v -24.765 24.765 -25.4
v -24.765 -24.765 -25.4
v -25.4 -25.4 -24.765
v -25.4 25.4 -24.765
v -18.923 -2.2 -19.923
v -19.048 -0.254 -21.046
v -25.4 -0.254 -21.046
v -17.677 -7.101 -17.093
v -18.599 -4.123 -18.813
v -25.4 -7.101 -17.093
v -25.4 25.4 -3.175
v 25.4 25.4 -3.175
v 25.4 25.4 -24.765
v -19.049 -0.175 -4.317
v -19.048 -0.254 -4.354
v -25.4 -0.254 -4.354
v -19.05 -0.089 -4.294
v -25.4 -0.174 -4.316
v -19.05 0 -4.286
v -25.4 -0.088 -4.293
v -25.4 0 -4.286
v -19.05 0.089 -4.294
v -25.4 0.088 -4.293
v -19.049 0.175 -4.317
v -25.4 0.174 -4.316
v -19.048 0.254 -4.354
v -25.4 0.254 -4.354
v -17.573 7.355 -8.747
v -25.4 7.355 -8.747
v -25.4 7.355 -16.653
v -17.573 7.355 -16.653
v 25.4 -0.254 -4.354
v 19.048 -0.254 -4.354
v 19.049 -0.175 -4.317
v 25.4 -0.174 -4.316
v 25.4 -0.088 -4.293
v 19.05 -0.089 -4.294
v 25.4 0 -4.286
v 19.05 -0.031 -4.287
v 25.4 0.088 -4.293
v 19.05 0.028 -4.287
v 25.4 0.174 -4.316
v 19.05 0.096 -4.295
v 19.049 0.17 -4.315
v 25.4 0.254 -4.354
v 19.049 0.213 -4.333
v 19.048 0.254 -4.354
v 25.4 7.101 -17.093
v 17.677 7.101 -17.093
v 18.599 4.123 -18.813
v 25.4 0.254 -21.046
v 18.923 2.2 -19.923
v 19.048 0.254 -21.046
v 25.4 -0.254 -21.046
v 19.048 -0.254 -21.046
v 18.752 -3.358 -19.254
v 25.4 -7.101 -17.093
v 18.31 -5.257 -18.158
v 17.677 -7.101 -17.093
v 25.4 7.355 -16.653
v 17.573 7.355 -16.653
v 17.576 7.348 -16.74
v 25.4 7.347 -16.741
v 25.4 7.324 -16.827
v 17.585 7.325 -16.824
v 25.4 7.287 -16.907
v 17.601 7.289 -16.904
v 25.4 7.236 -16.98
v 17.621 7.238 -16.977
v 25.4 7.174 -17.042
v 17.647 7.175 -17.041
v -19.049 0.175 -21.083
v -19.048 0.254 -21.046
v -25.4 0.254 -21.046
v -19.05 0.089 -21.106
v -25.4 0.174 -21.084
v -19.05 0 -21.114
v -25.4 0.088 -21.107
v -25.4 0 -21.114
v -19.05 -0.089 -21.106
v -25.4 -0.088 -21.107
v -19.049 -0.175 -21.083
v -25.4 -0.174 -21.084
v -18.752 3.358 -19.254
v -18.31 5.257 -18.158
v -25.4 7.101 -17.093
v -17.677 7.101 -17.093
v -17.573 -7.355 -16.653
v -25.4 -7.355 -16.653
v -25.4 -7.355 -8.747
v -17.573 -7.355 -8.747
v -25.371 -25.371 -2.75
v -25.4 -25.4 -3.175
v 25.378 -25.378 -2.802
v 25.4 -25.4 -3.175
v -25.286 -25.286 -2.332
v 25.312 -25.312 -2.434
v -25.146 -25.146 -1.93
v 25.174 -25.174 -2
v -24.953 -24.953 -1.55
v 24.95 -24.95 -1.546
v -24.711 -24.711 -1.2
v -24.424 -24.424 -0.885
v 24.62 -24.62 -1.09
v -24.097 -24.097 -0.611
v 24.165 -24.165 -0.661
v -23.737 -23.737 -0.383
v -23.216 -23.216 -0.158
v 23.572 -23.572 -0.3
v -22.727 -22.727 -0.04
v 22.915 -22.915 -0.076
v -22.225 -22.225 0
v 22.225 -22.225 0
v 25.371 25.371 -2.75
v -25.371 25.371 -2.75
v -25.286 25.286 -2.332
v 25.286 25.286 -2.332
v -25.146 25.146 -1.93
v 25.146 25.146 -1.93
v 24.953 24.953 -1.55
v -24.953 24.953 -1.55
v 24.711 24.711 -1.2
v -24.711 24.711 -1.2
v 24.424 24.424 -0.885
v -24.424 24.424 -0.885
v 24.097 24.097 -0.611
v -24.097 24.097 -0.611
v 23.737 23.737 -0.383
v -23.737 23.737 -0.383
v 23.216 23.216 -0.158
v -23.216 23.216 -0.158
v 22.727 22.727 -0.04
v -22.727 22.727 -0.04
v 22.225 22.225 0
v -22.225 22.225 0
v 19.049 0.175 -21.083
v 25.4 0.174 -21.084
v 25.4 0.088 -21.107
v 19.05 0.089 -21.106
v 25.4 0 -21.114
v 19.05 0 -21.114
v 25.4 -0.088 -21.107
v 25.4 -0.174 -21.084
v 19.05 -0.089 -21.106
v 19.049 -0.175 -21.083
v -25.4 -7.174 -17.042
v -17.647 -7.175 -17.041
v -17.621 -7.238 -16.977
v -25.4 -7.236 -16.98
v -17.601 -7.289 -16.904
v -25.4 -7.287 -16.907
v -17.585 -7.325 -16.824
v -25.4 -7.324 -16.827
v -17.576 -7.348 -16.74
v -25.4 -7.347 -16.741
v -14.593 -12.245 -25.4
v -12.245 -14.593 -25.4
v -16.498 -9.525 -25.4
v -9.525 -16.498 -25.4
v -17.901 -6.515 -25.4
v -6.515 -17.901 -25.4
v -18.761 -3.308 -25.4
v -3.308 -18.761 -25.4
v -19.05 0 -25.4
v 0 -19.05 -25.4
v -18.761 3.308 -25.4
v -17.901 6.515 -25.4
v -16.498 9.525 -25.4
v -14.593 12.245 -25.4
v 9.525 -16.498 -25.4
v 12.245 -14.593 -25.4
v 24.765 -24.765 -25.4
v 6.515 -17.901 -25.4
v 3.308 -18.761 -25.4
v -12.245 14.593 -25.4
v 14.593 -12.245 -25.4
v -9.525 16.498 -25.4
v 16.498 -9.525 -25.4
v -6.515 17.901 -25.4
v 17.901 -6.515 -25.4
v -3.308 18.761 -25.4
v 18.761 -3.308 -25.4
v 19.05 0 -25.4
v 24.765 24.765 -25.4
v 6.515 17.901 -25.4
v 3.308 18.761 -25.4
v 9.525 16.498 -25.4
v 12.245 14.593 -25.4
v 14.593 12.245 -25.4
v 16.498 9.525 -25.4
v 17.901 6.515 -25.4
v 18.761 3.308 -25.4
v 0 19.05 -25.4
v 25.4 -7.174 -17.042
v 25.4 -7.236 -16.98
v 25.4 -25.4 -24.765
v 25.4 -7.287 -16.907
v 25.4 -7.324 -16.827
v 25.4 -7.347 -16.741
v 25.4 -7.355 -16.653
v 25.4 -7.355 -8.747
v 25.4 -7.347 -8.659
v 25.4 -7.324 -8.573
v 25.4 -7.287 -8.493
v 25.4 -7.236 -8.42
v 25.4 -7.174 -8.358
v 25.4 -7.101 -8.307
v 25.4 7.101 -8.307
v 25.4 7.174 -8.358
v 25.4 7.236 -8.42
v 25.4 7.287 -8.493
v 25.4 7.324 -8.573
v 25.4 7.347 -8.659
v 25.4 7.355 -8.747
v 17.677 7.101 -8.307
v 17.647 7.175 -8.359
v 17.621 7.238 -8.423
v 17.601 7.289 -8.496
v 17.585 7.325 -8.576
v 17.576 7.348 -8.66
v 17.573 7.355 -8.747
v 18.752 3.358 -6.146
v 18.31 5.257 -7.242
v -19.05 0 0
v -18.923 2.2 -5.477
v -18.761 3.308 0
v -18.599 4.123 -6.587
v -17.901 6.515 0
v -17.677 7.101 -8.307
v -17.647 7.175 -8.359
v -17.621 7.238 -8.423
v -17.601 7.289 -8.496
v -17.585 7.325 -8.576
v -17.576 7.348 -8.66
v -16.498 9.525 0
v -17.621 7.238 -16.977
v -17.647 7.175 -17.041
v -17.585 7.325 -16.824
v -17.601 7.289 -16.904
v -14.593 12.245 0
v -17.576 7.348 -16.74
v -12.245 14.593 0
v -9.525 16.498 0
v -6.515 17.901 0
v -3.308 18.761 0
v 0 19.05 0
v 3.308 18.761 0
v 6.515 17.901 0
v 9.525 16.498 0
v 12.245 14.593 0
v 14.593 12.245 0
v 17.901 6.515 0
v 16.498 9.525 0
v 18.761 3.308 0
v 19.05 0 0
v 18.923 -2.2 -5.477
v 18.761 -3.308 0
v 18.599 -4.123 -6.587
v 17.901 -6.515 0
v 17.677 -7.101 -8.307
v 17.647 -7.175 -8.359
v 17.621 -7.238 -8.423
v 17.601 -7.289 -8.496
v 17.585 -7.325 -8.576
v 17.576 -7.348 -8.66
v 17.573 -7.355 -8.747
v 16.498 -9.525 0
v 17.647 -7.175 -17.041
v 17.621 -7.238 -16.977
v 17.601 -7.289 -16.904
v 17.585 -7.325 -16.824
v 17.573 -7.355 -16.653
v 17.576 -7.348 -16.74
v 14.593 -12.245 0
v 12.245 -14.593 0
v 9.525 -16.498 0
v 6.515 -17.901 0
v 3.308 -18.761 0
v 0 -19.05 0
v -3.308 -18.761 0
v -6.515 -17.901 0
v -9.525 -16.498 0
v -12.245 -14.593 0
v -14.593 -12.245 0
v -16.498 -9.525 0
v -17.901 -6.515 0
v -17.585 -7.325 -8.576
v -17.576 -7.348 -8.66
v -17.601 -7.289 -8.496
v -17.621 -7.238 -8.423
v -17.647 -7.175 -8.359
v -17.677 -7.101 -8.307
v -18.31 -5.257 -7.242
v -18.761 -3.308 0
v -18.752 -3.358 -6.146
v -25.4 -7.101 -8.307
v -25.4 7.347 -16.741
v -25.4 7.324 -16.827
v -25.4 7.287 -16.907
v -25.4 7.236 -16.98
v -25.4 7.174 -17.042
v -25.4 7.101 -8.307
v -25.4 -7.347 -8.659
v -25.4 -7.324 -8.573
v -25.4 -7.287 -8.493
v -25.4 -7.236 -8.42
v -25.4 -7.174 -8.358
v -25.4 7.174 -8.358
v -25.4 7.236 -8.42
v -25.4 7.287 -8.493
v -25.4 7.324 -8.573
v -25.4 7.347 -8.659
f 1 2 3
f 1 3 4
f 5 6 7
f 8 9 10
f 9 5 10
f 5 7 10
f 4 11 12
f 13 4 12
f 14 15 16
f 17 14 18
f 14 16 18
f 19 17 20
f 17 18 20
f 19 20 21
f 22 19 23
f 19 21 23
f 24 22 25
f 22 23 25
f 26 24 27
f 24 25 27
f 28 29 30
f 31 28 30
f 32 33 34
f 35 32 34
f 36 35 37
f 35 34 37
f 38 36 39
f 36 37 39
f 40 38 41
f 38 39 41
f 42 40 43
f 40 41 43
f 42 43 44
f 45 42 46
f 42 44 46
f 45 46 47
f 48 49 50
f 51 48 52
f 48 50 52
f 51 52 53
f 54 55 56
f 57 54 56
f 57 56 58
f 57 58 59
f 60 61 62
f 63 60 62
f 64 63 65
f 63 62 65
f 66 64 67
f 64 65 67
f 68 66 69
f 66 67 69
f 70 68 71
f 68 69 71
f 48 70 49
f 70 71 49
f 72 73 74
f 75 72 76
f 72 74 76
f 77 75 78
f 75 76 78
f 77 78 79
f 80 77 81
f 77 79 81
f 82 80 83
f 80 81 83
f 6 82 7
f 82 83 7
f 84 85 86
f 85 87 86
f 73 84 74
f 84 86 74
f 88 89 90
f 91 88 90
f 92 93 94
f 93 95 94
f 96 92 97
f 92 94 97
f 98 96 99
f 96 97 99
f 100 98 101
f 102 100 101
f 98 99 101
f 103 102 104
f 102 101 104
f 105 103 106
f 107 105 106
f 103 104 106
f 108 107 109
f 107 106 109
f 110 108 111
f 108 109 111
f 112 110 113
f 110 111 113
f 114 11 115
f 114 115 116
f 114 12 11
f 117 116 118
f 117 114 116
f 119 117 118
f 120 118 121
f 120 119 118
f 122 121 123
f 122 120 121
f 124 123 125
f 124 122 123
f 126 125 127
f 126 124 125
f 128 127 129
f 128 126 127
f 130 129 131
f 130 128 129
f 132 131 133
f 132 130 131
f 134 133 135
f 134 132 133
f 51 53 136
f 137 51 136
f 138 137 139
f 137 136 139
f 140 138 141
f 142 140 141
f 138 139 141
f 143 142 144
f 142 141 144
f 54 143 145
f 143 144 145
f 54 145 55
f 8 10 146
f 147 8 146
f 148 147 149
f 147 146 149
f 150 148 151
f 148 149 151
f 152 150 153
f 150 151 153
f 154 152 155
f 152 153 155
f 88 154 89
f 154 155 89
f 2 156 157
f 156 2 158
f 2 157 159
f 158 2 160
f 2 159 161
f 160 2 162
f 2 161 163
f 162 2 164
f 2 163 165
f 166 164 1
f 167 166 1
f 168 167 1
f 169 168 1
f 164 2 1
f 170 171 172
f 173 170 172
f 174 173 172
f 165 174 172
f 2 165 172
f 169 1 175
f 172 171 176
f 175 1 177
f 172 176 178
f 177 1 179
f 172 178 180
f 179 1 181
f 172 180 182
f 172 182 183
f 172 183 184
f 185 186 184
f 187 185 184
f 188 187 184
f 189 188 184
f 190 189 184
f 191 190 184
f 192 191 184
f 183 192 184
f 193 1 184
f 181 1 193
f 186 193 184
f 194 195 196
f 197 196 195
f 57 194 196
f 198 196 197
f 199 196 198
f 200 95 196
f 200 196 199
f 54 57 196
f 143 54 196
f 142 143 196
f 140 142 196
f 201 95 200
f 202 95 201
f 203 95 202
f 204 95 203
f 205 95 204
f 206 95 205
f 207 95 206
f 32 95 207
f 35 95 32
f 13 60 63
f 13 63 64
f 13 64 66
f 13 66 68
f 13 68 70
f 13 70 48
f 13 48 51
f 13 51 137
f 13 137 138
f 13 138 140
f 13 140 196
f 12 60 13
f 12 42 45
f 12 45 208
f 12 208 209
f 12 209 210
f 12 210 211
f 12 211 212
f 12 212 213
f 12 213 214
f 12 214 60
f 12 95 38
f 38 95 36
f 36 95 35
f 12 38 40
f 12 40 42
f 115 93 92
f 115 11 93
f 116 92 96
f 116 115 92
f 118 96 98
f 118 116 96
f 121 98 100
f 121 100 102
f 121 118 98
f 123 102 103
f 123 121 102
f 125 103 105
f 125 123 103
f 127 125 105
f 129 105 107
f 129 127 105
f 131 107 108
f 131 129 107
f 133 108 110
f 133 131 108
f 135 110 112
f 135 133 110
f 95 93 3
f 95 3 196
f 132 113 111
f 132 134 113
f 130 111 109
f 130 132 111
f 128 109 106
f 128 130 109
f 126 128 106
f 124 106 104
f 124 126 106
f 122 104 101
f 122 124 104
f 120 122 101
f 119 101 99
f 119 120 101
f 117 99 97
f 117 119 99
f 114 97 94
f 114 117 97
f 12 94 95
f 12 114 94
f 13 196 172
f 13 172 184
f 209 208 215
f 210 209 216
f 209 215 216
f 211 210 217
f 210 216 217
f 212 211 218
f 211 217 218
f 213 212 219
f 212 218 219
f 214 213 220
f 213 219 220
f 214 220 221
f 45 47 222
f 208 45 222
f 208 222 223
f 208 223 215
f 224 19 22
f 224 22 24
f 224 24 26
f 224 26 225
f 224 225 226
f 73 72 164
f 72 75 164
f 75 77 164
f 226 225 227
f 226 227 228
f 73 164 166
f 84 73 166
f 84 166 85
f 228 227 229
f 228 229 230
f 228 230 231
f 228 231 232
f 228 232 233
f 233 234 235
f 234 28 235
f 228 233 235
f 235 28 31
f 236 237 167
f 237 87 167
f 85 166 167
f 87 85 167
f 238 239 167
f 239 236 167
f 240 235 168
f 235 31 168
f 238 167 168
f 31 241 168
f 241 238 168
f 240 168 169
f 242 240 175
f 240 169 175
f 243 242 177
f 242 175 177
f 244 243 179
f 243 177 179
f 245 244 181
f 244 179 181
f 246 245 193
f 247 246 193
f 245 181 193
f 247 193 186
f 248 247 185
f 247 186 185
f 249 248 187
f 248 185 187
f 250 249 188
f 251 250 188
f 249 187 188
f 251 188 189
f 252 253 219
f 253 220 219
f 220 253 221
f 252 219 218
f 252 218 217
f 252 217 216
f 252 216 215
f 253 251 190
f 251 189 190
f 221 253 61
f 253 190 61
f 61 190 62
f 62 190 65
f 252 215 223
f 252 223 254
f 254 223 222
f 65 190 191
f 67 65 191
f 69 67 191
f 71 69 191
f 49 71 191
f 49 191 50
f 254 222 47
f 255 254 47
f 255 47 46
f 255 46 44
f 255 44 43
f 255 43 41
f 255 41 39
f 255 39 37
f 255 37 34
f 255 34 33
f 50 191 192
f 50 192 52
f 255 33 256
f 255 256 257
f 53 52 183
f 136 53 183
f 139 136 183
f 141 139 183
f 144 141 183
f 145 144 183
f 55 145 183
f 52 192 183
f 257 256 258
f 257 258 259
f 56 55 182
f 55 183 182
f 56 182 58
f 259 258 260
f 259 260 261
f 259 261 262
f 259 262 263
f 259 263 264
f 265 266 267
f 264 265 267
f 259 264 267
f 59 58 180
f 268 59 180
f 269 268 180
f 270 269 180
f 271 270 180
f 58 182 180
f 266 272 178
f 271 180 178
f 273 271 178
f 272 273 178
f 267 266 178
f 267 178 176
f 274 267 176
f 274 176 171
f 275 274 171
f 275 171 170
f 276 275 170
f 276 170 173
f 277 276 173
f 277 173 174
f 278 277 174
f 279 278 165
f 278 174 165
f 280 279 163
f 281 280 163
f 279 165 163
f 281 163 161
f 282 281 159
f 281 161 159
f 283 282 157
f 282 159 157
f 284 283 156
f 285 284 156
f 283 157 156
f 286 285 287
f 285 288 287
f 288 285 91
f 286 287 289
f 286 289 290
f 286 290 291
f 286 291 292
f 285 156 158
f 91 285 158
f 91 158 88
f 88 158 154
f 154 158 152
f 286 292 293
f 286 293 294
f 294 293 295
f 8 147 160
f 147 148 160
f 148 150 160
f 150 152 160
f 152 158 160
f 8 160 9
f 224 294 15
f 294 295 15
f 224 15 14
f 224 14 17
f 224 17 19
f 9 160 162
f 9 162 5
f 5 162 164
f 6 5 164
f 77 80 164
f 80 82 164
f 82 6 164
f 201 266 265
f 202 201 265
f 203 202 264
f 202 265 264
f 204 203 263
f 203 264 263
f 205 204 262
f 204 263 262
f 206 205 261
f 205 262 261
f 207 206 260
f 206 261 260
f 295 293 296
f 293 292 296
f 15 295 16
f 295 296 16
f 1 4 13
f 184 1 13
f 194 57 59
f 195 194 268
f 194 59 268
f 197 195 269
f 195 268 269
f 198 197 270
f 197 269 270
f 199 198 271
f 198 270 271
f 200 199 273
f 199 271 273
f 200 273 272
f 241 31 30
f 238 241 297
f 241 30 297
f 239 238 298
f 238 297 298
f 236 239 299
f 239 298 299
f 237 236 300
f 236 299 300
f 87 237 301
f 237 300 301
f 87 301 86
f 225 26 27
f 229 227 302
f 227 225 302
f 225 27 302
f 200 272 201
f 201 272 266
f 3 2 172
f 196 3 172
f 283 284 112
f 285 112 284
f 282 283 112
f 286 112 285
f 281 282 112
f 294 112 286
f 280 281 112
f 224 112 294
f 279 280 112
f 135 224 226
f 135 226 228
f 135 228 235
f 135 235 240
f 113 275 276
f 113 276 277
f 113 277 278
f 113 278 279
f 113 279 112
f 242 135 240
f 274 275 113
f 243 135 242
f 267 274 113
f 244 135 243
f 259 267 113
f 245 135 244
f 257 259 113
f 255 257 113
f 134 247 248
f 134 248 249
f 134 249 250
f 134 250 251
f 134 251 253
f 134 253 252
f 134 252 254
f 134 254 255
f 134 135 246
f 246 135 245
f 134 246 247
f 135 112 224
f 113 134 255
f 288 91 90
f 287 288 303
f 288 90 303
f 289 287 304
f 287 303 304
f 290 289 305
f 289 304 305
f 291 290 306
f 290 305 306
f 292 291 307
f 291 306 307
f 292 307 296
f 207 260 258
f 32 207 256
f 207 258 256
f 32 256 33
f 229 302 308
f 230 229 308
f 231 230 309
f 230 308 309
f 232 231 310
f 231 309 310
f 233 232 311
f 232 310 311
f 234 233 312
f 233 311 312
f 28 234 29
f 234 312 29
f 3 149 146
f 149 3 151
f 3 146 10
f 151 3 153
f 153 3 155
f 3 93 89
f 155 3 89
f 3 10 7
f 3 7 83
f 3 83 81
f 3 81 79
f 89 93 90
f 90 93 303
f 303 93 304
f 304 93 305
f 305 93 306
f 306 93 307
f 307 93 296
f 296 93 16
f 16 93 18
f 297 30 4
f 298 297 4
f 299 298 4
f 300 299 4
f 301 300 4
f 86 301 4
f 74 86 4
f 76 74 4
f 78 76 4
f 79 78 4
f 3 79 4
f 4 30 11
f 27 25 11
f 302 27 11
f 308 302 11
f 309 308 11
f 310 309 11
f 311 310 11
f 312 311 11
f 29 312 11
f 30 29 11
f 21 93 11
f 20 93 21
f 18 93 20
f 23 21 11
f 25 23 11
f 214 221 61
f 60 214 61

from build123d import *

# Parameters (mm, degrees)
F0_W     = 50.8
F0_H     = 50.8
F1_DEPTH = 25.4
F3_D     = 38.1
F4_R     = 3.175
F5_SIZE  = 0.635
F7_DEPTH = 50.801


with BuildPart() as f1:
    # F0 (on Top) → F1 (new body)
    with BuildSketch(Plane.XY):
        Rectangle(F0_W, F0_H)
    extrude(amount=-F1_DEPTH)

    # F3 (through all)
    with Locations(Plane.XY):
        with Locations((0, 0)):
            Hole(F3_D / 2)

    # F4
    f4_edges = [f1.edges().sort_by_distance(p)[0] for p in [
        (0, 25.4, 0),
        (25.4, 0, 0),
        (0, -25.4, 0),
        (-25.4, 0, 0),
    ]]
    fillet(f4_edges, radius=F4_R)

    # F5
    f5_edges = [f1.edges().sort_by_distance(p)[0] for p in [
        (0, 25.4, -25.4),
        (-25.4, 0, -25.4),
        (0, -25.4, -25.4),
        (25.4, 0, -25.4),
    ]]
    chamfer(f5_edges, length=F5_SIZE)

    # F6 (on face) → F7 (cut, through all)
    with BuildSketch(Plane(origin=(-25.4, 0, 0), x_dir=(0, -1, 0), z_dir=(-1, 0, 0))):
        with BuildLine():
            Line((7.355005, -16.65312), (7.355005, -8.74688))
            ThreePointArc((7.355005, -8.74688), (7.286946, -8.49288), (7.101005, -8.306939))
            Line((7.101005, -8.306939), (0.254, -4.353819))
            ThreePointArc((0.254, -4.353819), (0, -4.28576), (-0.254, -4.353819))
            Line((-0.254, -4.353819), (-7.101005, -8.306939))
            ThreePointArc((-7.101005, -8.306939), (-7.286946, -8.49288), (-7.355005, -8.74688))
            Line((-7.355005, -8.74688), (-7.355005, -16.65312))
            ThreePointArc((-7.355005, -16.65312), (-7.286946, -16.90712), (-7.101005, -17.093061))
            Line((-7.101005, -17.093061), (-0.254, -21.046181))
            ThreePointArc((-0.254, -21.046181), (0, -21.11424), (0.254, -21.046181))
            Line((0.254, -21.046181), (7.101005, -17.093061))
            ThreePointArc((7.101005, -17.093061), (7.286946, -16.90712), (7.355005, -16.65312))
        make_face()
    extrude(amount=-F7_DEPTH, mode=Mode.SUBTRACT)


solid = f1.part
